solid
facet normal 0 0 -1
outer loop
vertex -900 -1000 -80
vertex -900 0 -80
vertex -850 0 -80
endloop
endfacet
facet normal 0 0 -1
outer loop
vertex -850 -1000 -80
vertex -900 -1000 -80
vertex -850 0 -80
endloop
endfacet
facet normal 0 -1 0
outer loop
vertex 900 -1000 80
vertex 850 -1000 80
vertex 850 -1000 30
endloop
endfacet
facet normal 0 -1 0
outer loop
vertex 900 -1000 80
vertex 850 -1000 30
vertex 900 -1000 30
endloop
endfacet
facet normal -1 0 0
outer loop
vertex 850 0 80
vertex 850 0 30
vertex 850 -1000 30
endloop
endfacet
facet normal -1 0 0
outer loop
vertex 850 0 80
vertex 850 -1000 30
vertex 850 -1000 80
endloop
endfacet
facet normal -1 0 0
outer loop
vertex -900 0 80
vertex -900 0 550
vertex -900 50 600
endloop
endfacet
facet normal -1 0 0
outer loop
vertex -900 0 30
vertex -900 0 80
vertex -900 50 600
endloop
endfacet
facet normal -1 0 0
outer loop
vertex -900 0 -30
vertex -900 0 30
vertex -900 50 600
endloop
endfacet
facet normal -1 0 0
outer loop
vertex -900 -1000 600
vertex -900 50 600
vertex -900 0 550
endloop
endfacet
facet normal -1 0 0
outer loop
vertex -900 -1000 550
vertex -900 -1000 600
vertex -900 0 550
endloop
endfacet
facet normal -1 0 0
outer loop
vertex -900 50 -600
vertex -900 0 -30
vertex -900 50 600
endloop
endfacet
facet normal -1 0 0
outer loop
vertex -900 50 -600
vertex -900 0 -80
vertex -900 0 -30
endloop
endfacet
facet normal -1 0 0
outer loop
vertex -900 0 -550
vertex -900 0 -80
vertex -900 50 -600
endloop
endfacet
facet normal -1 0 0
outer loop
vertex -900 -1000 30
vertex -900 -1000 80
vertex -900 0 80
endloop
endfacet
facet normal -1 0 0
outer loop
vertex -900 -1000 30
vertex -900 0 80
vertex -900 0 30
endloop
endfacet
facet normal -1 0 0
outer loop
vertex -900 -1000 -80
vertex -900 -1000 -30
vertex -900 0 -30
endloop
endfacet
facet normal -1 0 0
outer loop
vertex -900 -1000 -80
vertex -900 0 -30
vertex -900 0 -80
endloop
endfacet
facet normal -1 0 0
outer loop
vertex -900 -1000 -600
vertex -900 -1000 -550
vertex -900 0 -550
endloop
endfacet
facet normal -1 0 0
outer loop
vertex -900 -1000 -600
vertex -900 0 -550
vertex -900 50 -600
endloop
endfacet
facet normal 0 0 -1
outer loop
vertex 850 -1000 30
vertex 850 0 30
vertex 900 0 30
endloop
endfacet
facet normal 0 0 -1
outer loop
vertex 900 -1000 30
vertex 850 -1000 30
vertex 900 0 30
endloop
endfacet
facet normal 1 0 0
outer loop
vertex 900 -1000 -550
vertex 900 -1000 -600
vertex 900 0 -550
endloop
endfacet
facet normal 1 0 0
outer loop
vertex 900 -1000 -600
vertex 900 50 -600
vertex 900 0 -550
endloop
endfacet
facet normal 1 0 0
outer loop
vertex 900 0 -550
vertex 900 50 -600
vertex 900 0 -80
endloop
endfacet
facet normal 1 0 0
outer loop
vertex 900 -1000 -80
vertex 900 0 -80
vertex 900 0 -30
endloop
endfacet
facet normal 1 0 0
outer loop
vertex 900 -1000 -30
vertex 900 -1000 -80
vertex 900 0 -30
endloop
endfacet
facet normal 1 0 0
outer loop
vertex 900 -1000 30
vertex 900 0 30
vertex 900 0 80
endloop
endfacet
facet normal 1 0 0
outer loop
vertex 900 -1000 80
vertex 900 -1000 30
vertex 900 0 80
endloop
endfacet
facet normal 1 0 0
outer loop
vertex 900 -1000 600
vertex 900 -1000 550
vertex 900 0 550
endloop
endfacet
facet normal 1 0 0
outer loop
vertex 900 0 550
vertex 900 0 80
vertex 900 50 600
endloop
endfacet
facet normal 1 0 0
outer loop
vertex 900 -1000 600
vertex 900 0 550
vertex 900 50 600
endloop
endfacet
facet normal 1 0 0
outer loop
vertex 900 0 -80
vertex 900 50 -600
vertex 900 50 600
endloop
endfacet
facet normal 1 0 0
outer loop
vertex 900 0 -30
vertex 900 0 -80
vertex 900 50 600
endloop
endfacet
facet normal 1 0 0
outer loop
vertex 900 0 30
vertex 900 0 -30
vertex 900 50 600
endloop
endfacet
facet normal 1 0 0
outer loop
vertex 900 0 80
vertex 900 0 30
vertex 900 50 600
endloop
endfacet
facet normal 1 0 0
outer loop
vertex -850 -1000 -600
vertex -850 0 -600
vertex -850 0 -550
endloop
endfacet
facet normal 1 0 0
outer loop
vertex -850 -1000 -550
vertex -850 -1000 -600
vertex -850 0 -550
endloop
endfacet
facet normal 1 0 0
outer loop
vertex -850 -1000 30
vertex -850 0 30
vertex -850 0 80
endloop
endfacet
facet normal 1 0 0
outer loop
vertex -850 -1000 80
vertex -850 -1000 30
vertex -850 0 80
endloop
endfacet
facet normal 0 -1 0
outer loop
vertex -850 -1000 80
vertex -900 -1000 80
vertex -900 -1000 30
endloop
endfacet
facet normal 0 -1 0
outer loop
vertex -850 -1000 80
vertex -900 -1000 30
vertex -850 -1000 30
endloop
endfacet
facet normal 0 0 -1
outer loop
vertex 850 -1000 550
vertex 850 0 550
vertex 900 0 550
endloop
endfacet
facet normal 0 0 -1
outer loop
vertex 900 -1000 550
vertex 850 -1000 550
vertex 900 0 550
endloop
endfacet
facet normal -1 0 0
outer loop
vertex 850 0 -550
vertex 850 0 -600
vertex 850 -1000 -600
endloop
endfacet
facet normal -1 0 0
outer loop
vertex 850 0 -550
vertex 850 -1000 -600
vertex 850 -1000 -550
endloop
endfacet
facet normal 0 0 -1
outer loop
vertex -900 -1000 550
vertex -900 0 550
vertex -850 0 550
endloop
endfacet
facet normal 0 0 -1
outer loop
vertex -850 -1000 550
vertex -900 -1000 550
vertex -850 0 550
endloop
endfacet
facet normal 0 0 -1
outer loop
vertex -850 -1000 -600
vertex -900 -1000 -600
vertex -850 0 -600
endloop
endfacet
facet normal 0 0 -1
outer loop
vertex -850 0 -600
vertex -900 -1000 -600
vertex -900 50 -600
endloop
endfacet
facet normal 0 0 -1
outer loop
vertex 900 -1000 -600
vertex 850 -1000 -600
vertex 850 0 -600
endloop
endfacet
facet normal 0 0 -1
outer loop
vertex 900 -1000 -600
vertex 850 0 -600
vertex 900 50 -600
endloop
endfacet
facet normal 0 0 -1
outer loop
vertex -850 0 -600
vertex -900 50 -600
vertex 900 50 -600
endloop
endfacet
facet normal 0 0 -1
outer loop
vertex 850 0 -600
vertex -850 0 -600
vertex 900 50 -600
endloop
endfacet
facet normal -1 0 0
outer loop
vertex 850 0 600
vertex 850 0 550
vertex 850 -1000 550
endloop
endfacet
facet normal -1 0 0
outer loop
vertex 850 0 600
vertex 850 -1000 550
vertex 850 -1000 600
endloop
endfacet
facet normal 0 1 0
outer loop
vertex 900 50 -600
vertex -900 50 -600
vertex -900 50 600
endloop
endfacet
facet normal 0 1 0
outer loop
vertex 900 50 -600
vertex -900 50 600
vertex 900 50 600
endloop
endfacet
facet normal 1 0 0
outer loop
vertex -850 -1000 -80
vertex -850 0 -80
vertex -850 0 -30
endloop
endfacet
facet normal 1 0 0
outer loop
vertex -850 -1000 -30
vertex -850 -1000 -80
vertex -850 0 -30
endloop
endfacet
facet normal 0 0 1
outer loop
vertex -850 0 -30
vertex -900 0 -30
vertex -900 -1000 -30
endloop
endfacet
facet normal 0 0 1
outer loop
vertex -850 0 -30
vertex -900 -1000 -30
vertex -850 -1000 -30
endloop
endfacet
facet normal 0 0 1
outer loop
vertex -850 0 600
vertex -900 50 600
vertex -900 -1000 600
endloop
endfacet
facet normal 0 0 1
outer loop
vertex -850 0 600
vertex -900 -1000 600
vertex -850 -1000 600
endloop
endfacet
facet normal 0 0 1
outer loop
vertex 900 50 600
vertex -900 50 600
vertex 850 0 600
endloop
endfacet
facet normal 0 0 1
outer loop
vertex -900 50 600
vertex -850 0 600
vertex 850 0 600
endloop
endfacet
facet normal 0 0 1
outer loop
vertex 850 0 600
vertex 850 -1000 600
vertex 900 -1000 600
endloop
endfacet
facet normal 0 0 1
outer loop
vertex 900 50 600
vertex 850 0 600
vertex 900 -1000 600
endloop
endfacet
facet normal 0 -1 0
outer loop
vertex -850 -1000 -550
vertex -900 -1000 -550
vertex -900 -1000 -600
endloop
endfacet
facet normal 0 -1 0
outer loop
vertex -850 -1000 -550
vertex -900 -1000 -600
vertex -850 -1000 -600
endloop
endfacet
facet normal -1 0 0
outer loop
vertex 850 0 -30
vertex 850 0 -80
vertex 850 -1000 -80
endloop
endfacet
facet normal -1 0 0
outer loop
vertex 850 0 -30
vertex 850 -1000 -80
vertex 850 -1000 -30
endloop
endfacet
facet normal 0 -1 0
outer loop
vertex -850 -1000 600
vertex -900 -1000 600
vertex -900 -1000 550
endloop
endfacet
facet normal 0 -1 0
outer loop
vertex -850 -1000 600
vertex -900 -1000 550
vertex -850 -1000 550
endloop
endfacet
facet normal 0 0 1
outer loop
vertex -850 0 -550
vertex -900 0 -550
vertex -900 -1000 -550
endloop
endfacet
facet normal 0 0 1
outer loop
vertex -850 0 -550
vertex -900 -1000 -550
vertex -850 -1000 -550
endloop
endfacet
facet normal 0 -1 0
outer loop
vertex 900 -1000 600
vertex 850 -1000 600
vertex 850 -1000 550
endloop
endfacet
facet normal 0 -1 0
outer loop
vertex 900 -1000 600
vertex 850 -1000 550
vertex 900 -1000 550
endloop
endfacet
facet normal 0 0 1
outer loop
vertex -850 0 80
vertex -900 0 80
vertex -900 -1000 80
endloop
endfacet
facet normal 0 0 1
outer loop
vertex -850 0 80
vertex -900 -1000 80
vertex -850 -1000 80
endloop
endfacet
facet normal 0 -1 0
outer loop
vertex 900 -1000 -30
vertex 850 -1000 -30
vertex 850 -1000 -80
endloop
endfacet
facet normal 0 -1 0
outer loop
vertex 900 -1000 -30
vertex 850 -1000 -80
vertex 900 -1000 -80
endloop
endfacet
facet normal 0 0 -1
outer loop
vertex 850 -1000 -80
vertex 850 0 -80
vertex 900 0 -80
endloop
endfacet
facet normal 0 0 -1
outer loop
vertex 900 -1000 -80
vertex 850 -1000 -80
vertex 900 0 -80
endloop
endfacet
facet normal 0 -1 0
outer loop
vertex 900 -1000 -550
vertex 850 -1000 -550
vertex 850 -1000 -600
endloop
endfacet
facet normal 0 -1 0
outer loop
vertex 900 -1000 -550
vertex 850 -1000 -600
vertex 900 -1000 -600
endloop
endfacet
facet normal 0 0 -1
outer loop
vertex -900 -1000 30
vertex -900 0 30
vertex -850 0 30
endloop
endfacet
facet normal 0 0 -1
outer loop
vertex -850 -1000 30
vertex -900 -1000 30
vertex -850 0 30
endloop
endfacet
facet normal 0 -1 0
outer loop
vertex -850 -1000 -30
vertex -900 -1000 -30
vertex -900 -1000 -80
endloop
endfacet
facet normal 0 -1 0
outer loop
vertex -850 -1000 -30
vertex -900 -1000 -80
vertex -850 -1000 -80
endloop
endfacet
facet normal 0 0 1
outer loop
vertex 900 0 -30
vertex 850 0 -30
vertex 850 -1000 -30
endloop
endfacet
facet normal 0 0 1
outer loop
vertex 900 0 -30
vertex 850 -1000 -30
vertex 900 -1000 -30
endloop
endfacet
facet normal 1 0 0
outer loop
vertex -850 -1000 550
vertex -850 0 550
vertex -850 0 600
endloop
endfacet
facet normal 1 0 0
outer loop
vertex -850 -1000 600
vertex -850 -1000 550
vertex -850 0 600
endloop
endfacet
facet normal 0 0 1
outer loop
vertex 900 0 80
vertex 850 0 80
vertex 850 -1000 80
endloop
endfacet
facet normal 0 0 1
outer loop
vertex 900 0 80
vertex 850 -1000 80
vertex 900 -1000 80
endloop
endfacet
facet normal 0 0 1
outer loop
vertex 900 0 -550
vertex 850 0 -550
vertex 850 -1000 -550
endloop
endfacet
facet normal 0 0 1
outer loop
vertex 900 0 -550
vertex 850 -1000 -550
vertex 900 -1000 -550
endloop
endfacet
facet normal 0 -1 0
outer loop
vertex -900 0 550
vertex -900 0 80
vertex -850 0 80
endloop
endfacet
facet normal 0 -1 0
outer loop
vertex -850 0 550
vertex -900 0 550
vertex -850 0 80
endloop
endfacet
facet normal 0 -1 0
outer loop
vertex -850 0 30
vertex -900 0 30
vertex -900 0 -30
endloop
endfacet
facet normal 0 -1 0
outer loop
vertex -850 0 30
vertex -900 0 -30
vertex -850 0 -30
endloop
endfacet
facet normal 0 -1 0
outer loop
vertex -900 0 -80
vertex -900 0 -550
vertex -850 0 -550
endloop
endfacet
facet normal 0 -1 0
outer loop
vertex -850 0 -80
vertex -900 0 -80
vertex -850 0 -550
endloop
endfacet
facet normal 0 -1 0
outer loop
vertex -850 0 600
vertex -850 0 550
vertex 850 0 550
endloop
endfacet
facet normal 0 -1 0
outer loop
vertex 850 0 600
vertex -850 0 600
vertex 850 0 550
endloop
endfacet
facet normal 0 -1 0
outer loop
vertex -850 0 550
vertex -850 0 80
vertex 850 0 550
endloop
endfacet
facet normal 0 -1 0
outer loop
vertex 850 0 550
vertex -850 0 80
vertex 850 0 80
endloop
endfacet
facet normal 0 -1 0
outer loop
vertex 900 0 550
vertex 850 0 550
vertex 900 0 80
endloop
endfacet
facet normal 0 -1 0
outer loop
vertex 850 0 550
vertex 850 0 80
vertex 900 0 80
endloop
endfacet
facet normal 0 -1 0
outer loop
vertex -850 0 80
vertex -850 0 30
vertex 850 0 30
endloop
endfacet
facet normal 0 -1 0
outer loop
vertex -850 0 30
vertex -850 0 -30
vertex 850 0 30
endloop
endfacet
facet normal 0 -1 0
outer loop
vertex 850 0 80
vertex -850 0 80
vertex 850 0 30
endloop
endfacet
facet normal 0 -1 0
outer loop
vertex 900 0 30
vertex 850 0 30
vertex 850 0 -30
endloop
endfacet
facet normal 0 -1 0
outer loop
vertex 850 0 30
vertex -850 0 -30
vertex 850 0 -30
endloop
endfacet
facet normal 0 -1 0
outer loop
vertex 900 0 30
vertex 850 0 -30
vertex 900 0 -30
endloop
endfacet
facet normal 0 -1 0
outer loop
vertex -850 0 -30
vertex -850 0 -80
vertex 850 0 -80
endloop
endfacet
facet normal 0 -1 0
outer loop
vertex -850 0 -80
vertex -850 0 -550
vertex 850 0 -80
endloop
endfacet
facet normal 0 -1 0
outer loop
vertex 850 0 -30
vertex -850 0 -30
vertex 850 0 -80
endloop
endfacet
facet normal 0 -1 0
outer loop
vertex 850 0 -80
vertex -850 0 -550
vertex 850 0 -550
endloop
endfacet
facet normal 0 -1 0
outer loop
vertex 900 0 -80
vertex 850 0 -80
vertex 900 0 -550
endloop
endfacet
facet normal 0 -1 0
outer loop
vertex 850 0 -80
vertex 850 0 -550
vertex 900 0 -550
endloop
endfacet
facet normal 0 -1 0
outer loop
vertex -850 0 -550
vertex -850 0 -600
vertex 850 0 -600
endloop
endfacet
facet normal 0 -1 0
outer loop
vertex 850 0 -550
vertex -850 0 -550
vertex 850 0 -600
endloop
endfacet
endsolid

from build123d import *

# Parameters (mm, degrees)
SKETCH1_W           = 1800
SKETCH1_H           = 1200
BOSS_EXTRUDE1_DEPTH = 50
SKETCH2_W           = 50
SKETCH2_H           = 50
BOSS_EXTRUDE2_DEPTH = 1000


with BuildPart() as part:
    # Sketch1 → Boss-Extrude1 (new body)
    with BuildSketch(Plane(origin=(0, 0, 0), x_dir=(1, 0, 0), z_dir=(0, 1, 0))):
        Rectangle(SKETCH1_W, SKETCH1_H)
    extrude(amount=BOSS_EXTRUDE1_DEPTH)

    # Sketch2 → Boss-Extrude2 (add)
    with BuildSketch(Plane.XZ):
        with Locations((875, -575)):
            Rectangle(SKETCH2_W, SKETCH2_H)
        with Locations((-875, -575)):
            Rectangle(SKETCH2_W, SKETCH2_H)
        with Locations((-875, 575)):
            Rectangle(SKETCH2_W, SKETCH2_H)
        with Locations((875, 575)):
            Rectangle(SKETCH2_W, SKETCH2_H)
        with Locations((-875, 55)):
            Rectangle(SKETCH2_W, SKETCH2_H)
        with Locations((-875, -55)):
            Rectangle(SKETCH2_W, SKETCH2_H)
        with Locations((875, -55)):
            Rectangle(SKETCH2_W, SKETCH2_H)
        with Locations((875, 55)):
            Rectangle(SKETCH2_W, SKETCH2_H)
    extrude(amount=BOSS_EXTRUDE2_DEPTH)


solid = part.part
